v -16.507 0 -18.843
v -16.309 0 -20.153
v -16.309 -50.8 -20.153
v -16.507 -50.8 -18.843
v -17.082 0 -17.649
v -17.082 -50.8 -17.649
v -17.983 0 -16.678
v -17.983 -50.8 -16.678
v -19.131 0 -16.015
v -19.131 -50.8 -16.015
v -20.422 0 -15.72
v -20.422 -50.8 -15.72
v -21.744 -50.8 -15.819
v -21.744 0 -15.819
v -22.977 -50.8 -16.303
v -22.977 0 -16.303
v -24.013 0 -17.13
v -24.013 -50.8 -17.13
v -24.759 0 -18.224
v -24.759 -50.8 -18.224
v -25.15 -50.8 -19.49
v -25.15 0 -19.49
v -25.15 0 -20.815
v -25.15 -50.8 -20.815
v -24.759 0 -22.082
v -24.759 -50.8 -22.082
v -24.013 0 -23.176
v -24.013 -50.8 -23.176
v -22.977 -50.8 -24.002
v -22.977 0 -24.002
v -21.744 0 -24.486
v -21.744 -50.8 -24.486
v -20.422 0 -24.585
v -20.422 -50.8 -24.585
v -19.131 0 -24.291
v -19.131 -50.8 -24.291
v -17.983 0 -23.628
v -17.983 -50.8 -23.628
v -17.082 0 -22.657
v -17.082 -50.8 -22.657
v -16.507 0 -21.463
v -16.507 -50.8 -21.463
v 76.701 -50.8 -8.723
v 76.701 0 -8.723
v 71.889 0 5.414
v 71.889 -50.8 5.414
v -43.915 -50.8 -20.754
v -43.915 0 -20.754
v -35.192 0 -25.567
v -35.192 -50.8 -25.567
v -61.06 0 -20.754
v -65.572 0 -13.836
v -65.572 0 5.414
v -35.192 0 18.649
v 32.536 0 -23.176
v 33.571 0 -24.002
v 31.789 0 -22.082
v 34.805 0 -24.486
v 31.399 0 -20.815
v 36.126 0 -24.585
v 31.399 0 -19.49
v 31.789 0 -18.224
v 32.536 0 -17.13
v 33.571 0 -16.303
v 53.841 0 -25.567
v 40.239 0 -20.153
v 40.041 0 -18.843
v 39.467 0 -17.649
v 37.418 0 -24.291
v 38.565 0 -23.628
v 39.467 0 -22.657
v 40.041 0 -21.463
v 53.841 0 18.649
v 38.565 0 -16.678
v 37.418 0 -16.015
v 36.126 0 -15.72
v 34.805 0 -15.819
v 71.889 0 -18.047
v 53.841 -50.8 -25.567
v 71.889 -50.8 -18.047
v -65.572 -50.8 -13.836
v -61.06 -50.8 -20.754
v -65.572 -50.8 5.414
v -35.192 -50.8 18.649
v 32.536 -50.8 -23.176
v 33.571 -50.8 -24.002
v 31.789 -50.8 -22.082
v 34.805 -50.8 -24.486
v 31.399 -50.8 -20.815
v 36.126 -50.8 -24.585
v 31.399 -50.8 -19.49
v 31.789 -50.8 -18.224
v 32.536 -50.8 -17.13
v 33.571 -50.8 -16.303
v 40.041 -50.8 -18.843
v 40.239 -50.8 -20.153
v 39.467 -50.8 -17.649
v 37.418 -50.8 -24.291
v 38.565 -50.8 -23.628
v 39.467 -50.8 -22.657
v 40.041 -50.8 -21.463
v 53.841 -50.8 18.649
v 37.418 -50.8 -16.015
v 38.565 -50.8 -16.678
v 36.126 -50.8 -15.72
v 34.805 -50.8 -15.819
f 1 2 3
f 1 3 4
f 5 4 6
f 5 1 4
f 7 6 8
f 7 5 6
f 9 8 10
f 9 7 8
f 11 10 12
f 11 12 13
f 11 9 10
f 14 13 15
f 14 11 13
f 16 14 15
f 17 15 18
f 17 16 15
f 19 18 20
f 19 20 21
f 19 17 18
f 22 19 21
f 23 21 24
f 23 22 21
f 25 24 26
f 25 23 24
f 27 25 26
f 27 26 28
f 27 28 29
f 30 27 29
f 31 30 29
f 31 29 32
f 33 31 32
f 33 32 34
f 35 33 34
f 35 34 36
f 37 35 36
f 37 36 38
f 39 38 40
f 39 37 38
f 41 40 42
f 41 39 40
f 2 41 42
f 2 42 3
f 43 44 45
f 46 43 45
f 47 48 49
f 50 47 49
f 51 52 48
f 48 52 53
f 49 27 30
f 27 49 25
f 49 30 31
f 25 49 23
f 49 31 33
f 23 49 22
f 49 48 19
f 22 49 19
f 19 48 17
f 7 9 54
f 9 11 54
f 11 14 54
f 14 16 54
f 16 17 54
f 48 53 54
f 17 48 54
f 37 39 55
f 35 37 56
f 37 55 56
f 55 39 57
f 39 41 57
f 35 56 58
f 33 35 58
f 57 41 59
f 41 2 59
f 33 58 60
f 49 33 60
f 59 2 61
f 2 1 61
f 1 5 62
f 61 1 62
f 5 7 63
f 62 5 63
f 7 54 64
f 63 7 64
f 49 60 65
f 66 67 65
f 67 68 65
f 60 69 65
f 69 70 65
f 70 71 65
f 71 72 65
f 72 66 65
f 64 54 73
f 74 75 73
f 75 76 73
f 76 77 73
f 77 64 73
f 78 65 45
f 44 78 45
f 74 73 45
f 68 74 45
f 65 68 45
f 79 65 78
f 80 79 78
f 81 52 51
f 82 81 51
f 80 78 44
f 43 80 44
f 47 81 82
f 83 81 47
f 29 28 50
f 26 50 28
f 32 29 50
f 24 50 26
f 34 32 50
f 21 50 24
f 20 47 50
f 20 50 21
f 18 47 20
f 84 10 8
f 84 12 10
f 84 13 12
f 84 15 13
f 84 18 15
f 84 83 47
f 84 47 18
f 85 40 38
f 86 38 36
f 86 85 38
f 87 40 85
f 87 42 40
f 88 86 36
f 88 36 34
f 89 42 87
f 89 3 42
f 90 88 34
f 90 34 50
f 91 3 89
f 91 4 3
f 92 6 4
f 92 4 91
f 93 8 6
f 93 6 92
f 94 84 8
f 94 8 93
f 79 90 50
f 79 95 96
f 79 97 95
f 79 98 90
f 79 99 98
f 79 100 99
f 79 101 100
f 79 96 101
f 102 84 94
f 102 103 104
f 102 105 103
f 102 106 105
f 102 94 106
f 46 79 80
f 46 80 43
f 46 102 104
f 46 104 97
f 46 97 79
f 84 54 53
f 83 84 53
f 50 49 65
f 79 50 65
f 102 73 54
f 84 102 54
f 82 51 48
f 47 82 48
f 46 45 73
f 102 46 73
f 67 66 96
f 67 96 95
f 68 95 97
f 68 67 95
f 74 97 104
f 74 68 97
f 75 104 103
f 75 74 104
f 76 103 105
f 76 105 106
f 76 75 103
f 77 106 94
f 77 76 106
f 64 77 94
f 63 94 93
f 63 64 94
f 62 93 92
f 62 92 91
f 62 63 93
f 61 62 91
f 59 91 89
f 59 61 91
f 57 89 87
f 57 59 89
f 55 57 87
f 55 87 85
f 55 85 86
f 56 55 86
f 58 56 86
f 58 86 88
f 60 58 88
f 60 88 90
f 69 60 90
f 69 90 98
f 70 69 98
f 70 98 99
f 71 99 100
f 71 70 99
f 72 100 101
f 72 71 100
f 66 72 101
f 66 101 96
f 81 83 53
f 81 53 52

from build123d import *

# Parameters (mm, degrees)
F0_R     = 4.445
F1_DEPTH = 50.8


with BuildPart() as f1:
    # F0 (on Front) → F1 (new body)
    with BuildSketch(Plane.XZ):
        Polygon((53.841315, 18.648949), (-35.19237, 18.648949), (-65.572105, 5.414211), (-65.572105, -13.836316), (-61.060261, -20.754473), (-43.915264, -20.754473), (-35.19237, -25.567105), (53.841315, -25.567105), (71.888685, -18.047368), (76.701313, -8.722895), (71.888685, 5.414211), align=None)
        with Locations((-20.754473, -20.152895)):
            Circle(F0_R, mode=Mode.SUBTRACT)
        with Locations((35.793949, -20.152895)):
            Circle(F0_R, mode=Mode.SUBTRACT)
    extrude(amount=F1_DEPTH)


solid = f1.part
